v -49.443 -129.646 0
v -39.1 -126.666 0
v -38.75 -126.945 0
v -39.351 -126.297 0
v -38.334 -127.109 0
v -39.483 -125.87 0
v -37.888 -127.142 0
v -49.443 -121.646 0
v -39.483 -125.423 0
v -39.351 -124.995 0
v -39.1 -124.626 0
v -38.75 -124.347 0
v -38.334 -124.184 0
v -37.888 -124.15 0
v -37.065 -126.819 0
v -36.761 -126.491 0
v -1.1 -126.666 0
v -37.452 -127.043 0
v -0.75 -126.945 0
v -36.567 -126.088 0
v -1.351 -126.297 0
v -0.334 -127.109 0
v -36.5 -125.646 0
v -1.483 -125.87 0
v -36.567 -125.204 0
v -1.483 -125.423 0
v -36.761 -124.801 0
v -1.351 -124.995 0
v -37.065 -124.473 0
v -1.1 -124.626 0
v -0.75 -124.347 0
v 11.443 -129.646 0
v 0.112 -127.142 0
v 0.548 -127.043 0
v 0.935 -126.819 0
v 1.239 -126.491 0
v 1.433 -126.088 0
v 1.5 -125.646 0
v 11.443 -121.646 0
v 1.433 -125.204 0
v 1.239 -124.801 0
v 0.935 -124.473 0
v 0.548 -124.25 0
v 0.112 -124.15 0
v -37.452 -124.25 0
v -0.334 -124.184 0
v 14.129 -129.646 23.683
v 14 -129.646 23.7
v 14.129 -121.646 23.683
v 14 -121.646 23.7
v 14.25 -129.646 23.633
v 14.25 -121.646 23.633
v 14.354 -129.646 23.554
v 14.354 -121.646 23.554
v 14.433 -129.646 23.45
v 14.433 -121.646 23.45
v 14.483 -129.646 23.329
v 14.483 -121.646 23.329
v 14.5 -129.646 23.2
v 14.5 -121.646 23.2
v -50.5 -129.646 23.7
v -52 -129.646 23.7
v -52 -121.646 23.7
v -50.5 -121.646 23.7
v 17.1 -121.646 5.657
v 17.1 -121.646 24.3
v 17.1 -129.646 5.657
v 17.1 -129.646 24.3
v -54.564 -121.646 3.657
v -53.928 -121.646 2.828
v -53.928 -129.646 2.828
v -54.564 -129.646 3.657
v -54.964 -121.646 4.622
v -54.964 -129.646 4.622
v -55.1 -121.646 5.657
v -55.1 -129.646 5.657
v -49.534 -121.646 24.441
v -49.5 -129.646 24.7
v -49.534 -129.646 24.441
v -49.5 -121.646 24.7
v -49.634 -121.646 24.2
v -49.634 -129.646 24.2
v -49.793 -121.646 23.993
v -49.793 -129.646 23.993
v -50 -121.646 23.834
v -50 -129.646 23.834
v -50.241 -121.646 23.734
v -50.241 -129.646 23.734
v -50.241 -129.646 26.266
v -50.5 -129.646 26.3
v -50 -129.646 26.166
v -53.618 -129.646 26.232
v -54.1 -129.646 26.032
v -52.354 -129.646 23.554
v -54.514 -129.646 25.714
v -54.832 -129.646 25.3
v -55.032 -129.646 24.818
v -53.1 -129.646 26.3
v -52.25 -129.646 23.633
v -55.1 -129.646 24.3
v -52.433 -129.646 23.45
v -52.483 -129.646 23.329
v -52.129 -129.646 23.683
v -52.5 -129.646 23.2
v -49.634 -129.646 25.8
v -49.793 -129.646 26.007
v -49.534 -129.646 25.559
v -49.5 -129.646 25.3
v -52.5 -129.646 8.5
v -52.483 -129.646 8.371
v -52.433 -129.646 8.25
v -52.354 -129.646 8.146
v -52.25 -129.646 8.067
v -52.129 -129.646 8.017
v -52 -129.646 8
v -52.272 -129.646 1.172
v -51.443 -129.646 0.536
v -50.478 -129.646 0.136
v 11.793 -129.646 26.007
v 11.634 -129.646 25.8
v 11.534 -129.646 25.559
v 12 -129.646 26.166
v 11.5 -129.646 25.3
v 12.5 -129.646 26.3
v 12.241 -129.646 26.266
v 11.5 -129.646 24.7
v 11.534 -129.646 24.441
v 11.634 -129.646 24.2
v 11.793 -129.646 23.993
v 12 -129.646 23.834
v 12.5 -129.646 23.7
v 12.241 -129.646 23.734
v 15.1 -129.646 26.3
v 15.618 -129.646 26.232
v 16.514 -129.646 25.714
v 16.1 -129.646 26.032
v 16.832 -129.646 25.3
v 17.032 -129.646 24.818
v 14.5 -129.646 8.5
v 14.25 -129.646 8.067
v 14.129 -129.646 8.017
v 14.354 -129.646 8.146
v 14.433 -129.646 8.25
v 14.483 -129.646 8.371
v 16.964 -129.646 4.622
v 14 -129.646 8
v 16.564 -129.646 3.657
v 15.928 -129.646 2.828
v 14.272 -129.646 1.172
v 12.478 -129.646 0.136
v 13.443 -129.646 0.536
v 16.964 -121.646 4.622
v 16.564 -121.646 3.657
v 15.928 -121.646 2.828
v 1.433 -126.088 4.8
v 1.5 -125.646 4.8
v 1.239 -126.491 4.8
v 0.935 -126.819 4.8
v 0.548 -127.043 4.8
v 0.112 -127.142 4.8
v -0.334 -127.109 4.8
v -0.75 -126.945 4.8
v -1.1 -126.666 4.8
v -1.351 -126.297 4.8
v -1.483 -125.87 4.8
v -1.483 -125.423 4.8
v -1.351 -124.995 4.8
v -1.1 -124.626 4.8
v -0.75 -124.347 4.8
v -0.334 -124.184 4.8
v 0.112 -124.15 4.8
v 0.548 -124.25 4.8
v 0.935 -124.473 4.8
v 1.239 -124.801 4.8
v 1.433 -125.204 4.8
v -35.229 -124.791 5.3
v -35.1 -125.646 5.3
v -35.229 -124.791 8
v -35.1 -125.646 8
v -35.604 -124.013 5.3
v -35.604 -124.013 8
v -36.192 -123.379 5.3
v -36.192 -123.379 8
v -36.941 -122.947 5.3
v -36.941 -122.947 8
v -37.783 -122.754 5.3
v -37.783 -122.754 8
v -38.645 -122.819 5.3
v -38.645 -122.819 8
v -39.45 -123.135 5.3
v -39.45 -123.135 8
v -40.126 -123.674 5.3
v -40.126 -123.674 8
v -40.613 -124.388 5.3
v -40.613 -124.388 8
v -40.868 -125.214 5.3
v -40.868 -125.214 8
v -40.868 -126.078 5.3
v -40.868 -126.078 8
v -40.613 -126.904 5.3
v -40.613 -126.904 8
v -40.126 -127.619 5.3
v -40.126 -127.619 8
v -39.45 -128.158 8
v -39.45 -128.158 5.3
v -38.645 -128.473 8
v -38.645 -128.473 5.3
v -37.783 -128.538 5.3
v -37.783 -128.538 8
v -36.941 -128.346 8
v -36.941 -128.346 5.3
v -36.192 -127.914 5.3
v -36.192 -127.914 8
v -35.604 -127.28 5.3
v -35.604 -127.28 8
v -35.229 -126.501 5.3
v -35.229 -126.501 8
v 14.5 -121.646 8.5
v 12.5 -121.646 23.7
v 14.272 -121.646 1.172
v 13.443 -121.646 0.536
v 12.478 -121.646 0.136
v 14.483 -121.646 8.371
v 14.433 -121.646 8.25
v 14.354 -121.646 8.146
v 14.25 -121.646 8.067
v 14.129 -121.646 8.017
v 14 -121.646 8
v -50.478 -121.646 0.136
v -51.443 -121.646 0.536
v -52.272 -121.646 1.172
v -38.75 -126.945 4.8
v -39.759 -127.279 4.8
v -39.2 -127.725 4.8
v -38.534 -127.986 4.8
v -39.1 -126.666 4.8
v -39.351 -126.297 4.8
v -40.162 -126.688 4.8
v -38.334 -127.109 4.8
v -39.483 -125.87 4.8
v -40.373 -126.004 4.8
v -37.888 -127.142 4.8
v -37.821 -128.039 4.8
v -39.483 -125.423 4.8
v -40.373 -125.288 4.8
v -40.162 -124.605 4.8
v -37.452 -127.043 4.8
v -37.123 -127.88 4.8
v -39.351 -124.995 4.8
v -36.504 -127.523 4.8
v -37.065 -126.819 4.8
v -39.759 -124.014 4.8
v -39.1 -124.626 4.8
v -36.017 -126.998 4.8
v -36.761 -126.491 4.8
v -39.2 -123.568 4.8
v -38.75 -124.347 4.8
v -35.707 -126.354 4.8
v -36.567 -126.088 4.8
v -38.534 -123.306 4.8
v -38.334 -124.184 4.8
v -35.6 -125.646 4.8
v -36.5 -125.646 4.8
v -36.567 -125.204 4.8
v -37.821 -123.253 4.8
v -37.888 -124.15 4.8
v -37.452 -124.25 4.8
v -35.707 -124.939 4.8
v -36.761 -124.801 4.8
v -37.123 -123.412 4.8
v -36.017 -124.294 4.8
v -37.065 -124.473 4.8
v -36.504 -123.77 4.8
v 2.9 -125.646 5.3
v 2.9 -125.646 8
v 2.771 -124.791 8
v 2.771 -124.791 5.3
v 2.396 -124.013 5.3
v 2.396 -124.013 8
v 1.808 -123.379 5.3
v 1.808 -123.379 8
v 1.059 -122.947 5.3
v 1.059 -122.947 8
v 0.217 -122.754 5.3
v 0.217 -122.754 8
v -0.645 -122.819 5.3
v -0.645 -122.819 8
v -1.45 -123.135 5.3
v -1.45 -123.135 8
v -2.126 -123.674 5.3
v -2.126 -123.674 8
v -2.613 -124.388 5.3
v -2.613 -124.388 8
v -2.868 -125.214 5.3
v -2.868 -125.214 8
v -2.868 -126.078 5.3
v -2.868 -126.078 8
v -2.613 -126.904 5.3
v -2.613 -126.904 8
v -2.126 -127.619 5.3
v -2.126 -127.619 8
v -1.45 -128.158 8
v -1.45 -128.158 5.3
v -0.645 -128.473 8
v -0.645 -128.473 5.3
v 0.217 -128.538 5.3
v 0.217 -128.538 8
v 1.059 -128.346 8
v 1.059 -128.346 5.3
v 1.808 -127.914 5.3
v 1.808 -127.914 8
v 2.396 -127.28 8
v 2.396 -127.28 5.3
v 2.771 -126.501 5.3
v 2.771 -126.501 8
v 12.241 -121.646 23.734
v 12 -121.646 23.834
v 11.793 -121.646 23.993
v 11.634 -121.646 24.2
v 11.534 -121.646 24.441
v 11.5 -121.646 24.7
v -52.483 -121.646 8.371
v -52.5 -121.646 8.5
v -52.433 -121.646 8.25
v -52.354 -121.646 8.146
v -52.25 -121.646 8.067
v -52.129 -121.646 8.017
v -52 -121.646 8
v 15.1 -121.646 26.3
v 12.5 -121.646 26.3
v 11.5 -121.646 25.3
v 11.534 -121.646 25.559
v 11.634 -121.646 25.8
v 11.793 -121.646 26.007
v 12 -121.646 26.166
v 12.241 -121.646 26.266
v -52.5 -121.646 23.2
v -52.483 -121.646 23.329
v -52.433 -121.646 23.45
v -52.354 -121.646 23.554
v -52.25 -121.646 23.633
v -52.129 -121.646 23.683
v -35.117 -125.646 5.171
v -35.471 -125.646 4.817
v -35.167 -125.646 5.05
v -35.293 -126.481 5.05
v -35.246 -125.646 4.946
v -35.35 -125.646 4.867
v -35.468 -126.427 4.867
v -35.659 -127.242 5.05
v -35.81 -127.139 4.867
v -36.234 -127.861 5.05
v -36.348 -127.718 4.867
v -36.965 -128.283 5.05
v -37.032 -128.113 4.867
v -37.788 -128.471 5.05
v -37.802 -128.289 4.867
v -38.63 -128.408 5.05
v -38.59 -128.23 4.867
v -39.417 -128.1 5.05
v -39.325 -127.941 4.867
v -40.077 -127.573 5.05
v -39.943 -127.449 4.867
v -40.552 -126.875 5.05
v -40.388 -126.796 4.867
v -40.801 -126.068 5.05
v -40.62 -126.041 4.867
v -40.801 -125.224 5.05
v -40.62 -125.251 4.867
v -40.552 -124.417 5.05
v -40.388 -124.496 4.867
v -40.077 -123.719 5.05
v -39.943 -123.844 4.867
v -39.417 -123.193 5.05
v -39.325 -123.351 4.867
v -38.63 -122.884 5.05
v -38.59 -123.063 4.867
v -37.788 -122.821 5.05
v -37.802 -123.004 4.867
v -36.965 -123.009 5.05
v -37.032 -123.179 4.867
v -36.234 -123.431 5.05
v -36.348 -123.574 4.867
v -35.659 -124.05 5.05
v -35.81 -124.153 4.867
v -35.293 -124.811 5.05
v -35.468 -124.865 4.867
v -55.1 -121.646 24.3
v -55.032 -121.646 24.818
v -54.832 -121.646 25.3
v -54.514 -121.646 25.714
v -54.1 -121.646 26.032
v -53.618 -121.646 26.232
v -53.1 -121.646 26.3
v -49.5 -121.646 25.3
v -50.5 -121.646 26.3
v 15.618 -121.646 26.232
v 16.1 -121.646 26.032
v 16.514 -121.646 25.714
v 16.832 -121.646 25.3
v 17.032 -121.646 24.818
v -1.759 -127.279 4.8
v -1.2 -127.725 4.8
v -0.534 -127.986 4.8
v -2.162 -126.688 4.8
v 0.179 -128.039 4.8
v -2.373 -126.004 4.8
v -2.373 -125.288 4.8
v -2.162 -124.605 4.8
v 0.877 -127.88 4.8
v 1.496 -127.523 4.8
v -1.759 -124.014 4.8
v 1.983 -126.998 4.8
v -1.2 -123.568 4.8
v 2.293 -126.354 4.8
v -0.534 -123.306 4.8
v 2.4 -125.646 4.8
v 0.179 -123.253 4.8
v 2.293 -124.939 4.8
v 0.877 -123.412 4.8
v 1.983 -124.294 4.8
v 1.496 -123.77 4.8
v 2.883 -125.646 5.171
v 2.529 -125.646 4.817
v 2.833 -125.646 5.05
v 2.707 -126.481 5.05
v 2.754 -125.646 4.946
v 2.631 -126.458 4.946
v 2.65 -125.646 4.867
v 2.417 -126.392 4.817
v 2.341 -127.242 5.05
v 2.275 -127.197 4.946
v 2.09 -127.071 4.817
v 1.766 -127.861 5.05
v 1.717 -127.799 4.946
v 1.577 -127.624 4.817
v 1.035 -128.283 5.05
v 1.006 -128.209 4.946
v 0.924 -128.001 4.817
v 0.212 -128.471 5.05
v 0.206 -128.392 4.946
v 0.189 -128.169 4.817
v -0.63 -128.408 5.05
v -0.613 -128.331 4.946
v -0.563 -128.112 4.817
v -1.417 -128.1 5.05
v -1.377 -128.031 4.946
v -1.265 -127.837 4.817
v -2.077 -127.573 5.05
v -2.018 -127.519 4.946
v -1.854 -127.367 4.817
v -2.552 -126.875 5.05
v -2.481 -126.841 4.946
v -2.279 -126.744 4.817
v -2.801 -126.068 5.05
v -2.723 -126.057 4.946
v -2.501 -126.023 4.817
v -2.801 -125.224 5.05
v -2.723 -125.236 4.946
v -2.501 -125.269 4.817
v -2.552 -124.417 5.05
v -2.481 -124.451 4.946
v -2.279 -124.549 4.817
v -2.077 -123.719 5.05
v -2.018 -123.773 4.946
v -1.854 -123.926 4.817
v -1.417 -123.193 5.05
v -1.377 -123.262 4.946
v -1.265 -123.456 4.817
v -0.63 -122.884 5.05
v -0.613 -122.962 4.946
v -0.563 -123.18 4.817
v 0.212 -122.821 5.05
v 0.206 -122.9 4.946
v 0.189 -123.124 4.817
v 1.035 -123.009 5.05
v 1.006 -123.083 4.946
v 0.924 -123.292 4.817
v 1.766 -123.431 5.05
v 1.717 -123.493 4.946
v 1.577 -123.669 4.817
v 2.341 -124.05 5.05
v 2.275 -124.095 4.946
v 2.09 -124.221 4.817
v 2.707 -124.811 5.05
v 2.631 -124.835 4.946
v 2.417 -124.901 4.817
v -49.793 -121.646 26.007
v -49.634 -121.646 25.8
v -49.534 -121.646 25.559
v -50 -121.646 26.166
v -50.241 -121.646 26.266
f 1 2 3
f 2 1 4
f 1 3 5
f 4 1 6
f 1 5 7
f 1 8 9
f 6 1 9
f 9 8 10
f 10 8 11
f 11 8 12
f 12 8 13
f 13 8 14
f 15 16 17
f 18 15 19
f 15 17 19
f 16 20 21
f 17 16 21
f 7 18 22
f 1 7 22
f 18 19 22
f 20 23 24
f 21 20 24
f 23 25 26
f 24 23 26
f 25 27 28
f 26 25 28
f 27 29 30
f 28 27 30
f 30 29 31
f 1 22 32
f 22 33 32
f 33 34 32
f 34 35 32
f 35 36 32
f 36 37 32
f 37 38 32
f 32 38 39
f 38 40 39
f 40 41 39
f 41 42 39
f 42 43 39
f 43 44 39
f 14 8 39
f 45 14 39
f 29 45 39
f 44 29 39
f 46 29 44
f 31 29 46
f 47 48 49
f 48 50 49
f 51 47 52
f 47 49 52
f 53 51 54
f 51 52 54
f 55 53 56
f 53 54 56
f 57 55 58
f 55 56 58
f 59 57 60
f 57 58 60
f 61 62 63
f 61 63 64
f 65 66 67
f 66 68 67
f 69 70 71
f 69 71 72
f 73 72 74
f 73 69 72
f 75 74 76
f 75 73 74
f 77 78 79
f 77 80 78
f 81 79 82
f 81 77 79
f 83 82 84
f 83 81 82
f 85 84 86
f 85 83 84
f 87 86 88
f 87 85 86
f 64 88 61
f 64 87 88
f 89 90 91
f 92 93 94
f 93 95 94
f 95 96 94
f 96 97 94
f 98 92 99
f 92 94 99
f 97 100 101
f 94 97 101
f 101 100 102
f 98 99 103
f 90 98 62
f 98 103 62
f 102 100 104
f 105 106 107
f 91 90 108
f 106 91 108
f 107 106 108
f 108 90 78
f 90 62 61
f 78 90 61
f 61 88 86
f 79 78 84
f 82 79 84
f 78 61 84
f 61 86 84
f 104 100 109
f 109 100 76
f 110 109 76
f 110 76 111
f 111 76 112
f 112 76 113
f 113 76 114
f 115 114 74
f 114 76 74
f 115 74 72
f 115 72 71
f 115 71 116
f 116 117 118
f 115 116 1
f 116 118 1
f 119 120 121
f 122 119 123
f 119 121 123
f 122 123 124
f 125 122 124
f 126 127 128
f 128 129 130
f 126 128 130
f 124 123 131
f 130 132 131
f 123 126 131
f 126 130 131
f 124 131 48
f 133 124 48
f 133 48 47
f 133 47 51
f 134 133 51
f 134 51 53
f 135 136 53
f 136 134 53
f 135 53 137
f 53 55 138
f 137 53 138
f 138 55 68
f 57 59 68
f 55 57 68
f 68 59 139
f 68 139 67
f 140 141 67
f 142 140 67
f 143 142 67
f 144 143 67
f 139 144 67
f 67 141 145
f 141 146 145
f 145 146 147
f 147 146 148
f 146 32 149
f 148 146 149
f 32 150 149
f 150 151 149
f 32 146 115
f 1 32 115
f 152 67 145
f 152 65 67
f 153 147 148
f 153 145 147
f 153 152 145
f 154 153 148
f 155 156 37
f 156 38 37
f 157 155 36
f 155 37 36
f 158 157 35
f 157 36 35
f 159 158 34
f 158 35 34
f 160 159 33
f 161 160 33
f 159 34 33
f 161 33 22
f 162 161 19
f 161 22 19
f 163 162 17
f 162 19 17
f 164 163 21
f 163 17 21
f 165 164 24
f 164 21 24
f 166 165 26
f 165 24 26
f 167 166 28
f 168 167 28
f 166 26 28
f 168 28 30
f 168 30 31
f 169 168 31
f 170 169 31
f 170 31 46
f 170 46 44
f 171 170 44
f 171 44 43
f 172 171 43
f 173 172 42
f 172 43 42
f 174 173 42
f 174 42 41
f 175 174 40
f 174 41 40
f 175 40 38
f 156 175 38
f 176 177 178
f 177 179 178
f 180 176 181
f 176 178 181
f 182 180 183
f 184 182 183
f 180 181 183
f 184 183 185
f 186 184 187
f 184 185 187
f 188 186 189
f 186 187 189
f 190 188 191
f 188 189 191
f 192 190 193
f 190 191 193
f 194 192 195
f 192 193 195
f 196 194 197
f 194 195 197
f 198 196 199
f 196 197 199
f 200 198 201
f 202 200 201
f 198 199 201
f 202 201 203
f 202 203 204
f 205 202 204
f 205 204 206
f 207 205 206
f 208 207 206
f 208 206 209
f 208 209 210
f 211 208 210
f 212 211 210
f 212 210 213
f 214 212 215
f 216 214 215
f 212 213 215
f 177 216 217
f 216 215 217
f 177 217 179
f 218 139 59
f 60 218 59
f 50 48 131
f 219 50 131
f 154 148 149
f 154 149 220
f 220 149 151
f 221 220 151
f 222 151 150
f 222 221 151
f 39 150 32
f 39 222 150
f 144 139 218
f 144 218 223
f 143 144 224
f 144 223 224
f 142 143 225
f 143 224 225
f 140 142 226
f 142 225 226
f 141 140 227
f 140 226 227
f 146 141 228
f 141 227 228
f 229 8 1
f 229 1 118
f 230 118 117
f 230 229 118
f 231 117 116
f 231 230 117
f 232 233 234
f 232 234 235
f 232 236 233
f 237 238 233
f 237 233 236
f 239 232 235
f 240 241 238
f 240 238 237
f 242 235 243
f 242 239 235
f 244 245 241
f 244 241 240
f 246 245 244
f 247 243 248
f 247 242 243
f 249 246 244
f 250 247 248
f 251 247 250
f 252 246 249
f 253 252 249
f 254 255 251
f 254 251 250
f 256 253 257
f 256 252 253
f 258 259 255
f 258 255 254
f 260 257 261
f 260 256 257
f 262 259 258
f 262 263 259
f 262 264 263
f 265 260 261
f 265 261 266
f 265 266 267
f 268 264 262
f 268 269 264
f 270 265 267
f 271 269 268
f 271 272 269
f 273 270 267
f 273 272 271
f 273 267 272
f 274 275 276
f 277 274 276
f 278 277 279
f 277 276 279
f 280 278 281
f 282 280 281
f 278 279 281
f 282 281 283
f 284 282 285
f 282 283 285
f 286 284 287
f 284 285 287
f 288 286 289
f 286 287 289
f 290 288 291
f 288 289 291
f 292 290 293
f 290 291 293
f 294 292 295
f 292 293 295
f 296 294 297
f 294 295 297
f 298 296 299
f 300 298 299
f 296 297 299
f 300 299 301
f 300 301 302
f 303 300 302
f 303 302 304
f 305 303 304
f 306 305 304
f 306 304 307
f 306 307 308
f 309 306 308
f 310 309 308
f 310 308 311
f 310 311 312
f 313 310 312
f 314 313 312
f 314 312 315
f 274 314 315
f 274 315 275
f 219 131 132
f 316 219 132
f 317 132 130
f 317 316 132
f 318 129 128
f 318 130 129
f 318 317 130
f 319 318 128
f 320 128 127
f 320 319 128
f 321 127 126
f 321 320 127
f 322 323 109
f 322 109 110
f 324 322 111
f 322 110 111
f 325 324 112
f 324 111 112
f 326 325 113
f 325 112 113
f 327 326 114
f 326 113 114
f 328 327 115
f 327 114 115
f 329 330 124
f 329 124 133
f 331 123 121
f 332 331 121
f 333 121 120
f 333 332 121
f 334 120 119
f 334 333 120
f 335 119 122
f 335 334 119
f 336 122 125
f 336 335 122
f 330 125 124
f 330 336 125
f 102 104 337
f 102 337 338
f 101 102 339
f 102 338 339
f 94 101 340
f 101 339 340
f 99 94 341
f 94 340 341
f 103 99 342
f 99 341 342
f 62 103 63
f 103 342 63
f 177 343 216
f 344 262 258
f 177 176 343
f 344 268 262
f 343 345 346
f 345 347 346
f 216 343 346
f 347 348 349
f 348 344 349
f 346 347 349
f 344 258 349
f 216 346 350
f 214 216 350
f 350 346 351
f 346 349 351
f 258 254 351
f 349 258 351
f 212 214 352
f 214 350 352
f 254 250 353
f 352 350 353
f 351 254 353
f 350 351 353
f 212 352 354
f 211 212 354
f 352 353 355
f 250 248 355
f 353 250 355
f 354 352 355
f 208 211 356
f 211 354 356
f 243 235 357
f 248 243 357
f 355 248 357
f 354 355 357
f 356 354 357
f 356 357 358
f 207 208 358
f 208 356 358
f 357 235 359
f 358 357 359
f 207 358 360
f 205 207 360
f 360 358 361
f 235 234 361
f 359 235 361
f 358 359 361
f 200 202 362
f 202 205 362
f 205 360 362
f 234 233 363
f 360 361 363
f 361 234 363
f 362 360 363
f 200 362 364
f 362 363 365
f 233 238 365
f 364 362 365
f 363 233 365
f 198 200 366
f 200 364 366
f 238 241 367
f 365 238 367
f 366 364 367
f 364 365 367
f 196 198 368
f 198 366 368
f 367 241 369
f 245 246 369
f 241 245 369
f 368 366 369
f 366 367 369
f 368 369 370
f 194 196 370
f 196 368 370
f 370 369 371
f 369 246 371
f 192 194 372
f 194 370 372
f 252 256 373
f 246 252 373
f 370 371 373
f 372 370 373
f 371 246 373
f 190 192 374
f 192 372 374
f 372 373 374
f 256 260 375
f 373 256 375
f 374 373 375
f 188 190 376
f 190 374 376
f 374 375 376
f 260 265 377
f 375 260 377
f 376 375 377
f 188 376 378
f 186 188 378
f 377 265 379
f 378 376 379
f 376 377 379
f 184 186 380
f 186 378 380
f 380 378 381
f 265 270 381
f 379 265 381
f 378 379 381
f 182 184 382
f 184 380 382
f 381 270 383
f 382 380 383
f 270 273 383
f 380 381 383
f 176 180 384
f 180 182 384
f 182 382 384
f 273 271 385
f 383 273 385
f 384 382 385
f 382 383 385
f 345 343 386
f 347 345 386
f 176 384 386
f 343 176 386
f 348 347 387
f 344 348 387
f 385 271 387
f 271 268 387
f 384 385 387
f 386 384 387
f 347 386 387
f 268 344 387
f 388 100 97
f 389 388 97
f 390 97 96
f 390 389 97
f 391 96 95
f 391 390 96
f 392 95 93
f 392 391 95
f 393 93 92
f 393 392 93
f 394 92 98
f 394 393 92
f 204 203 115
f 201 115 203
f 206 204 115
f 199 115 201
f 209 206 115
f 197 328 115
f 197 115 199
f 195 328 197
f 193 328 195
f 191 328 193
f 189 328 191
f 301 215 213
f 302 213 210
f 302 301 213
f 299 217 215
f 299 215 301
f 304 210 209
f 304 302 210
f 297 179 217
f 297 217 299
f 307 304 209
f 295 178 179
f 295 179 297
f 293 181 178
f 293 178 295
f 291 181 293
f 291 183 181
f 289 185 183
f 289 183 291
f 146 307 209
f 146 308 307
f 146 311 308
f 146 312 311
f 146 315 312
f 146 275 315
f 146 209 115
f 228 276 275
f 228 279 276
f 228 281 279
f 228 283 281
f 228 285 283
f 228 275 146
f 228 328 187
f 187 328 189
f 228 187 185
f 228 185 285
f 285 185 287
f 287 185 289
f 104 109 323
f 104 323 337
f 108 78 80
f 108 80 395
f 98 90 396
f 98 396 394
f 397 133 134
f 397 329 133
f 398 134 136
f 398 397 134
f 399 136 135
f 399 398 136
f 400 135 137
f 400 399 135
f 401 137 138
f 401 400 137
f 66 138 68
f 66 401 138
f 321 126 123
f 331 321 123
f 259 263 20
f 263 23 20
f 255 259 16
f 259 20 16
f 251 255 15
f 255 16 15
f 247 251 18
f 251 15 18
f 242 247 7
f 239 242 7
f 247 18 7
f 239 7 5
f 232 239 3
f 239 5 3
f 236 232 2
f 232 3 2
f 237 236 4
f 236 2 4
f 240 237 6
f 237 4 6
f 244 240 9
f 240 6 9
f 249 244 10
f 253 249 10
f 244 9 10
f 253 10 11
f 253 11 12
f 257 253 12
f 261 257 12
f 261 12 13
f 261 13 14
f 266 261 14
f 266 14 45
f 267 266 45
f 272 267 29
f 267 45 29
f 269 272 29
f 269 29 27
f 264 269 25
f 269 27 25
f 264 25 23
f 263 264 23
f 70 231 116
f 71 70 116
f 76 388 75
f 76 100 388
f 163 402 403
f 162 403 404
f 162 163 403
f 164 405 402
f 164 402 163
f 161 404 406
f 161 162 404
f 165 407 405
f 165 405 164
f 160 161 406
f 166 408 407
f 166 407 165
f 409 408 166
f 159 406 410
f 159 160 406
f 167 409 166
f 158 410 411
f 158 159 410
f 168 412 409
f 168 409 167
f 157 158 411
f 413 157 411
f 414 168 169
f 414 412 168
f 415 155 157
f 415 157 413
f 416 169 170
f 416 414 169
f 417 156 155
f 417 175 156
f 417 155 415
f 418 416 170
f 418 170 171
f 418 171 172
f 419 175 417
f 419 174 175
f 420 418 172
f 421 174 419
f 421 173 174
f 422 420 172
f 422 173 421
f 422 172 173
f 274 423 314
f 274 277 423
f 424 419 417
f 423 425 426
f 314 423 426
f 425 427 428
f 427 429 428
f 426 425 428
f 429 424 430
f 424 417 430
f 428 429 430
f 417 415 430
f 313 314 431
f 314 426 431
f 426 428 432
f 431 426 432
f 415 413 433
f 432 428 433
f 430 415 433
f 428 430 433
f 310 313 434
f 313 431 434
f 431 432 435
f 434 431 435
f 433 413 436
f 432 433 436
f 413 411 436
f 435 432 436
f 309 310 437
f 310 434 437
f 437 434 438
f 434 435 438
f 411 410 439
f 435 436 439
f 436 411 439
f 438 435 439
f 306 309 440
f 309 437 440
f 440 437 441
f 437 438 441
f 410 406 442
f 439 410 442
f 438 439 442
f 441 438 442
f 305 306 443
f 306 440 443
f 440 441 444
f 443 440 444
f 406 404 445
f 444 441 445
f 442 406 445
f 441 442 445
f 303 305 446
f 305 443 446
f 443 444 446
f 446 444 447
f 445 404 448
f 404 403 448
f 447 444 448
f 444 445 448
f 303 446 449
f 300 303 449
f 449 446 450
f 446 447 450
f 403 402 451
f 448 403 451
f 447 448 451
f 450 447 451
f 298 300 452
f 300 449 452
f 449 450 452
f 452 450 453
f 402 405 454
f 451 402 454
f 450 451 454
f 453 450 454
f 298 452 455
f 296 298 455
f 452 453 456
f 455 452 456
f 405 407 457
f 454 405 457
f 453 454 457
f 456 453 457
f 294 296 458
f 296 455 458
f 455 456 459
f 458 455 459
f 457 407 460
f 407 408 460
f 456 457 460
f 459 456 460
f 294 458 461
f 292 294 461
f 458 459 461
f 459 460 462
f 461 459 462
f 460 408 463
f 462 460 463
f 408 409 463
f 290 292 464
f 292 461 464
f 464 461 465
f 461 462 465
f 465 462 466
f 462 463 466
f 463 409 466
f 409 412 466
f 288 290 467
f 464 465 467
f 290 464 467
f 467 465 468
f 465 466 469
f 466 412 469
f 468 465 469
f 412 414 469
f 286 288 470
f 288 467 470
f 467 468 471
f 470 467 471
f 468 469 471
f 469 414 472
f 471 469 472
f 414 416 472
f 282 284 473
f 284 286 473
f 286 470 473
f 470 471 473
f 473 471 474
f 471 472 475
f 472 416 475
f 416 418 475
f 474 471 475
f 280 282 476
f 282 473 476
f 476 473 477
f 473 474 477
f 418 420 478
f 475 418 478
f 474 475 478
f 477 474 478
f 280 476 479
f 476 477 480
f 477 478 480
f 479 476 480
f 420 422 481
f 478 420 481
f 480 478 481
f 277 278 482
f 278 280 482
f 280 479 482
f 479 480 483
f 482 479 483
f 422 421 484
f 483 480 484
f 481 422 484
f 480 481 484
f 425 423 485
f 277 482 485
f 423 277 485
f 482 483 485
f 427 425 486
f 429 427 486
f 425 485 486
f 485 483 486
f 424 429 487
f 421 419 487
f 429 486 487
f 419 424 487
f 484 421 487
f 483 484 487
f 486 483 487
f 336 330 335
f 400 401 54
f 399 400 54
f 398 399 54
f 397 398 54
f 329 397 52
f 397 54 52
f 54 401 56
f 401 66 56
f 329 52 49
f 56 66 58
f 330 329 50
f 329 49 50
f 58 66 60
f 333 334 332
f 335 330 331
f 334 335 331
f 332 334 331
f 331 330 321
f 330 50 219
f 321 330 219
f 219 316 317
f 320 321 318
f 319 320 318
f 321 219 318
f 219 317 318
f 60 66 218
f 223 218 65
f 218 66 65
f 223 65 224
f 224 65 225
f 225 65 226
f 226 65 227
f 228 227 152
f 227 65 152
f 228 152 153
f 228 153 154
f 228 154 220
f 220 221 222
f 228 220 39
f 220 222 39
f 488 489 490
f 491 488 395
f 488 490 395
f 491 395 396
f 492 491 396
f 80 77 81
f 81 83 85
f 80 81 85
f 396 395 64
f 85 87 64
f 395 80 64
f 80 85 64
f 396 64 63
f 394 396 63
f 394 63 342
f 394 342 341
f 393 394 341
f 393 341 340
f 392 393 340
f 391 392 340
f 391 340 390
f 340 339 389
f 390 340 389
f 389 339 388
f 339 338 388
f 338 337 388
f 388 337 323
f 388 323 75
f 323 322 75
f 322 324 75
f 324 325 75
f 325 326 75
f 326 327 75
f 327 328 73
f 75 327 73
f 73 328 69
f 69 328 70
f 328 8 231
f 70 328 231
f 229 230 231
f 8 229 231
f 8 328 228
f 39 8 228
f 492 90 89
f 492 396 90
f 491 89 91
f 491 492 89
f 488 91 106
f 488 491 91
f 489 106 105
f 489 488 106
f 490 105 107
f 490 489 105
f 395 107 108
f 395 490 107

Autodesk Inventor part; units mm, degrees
ref_plane "YZ Plane" through (0, 0, 0) normal (1, 0, 0) x (0, 1, 0)
ref_plane "XZ Plane" through (0, 0, 0) normal (0, 1, 0) x (-1, 0, 0)
ref_plane "Work Plane1" through (0, 0, 0) normal (0, 0, 1) x (1, 0, 0)
sketch "base_sketch" plane through (0, 0, 0) normal (0, 0, 1) x (1, 0, 0)
  circle A0 centre (0, -125.6462) radius 1.5 projected
  circle A1 centre (-38, -125.6462) radius 1.5 projected
  line L0 (14.5, -121.6462) -> (-52.5, -121.6462)
  line L1 (-52.5, -121.6462) -> (-52.5, -129.6462)
  line L2 (-52.5, -129.6462) -> (14.5, -129.6462)
  line L3 (14.5, -129.6462) -> (14.5, -121.6462)
  line L4 (-19, -121.6462) -> (-19, -129.6462) construction
  point P0 (0, 0)
  dimension "d1" = 67
  dimension "d4" = 38
  dimension "d5" = 19
  dimension "d6" = 4
  dimension "d7" = 4
extrude "base" add sketch "base_sketch" along normal blind 8
sketch "holes_bolt_head_sketch" plane through (0, 0, 8) normal (0, 0, 1) x (1, 0, 0)
  circle A0 centre (0, -125.6462) radius 1.5 construction
  circle A1 centre (0, -125.6462) radius 2.9
  circle A2 centre (-38, -125.6462) radius 1.5 construction
  circle A3 centre (-38, -125.6462) radius 2.9
  point P0 (0, 0)
  dimension "d10" = 5.8
  dimension "d11" = 5.8
extrude "holes_bolt_head" cut sketch "holes_bolt_head_sketch" against normal blind 3.2
fillet "bolt_head_fillet" radius 0.5 2 edges at (-40.9, -125.6462, 4.8) (-2.9, -125.6462, 4.8)
sketch "walls_sketch" plane through (-52.5, -129.6462, 0) normal (0, -1, 0) x (1, 0, 0)
  line L0 (0, 0) -> (67, 0) projected
  line L1 (67, 0) -> (67, 8) projected
  line L2 (0, 8) -> (67, 8) projected
  line L3 (0, 0) -> (0, 8) projected
  line L4 (67, 8) -> (0, 8) projected
  line L5 (0, 8) -> (0, 23.7)
  line L6 (0, 23.7) -> (3, 23.7)
  line L7 (0, 23.7) -> (3, 23.7) construction
  line L8 (3, 23.7) -> (3, 26.3)
  line L9 (3, 26.3) -> (-2.6, 26.3)
  line L10 (-2.6, 26.3) -> (-2.6, 0)
  line L11 (0, 0) -> (67, 0) projected
  line L12 (-2.6, 0) -> (0, 0)
  line L13 (0, 0) -> (0, 8) projected
  line L14 (33.5, 8) -> (33.5, 0) construction
  line L15 (67, 8) -> (67, 23.7)
  line L16 (67, 23.7) -> (64, 23.7)
  line L17 (64, 23.7) -> (64, 26.3)
  line L18 (64, 26.3) -> (69.6, 26.3)
  line L19 (69.6, 26.3) -> (69.6, 0)
  line L20 (69.6, 0) -> (67, 0)
  point P0 (52.5, 0)
  dimension "d15" = 15.7
  dimension "d16" = 3
  dimension "d17" = 0
  dimension "d18" = 2.6
  dimension "d19" = 2.6
extrude "walls" add sketch "walls_sketch" against normal up to surface (8 mm away) contours L12 L10 L9 L8 L6 L5 L3 | L1 L15 L16 L17 L18 L19 L20
fillet "wall_top" radius 2 2 edges at (-55.1, -125.6462, 26.3) (17.1, -125.6462, 26.3)
fillet "wall_tooth" radius 1 4 edges at (-49.5, -125.6462, 26.3) (-49.5, -125.6462, 23.7) (11.5, -125.6462, 23.7) (11.5, -125.6462, 26.3)
chamfer "wall_bottom" distance 4 angle 45 2 edges at (17.1, -125.6462, 0) (-55.1, -125.6462, 0)
fillet "wall_bottom_fillet" radius 4 4 edges at (-55.1, -125.6462, 4) (17.1, -125.6462, 4) (13.1, -125.6462, 0) (-51.1, -125.6462, 0)
fillet "inside" radius 0.5 4 edges at (14.5, -125.6462, 8) (-52.5, -125.6462, 8) (-52.5, -125.6462, 23.7) (14.5, -125.6462, 23.7)
equation "\"d5\" = 0.5 * d4"
equation "\"d7\" = d6"
equation "\"d10\" = d11"
properties part number "mount_enclosure_coral_dev_board" material "ABS Plastic"
